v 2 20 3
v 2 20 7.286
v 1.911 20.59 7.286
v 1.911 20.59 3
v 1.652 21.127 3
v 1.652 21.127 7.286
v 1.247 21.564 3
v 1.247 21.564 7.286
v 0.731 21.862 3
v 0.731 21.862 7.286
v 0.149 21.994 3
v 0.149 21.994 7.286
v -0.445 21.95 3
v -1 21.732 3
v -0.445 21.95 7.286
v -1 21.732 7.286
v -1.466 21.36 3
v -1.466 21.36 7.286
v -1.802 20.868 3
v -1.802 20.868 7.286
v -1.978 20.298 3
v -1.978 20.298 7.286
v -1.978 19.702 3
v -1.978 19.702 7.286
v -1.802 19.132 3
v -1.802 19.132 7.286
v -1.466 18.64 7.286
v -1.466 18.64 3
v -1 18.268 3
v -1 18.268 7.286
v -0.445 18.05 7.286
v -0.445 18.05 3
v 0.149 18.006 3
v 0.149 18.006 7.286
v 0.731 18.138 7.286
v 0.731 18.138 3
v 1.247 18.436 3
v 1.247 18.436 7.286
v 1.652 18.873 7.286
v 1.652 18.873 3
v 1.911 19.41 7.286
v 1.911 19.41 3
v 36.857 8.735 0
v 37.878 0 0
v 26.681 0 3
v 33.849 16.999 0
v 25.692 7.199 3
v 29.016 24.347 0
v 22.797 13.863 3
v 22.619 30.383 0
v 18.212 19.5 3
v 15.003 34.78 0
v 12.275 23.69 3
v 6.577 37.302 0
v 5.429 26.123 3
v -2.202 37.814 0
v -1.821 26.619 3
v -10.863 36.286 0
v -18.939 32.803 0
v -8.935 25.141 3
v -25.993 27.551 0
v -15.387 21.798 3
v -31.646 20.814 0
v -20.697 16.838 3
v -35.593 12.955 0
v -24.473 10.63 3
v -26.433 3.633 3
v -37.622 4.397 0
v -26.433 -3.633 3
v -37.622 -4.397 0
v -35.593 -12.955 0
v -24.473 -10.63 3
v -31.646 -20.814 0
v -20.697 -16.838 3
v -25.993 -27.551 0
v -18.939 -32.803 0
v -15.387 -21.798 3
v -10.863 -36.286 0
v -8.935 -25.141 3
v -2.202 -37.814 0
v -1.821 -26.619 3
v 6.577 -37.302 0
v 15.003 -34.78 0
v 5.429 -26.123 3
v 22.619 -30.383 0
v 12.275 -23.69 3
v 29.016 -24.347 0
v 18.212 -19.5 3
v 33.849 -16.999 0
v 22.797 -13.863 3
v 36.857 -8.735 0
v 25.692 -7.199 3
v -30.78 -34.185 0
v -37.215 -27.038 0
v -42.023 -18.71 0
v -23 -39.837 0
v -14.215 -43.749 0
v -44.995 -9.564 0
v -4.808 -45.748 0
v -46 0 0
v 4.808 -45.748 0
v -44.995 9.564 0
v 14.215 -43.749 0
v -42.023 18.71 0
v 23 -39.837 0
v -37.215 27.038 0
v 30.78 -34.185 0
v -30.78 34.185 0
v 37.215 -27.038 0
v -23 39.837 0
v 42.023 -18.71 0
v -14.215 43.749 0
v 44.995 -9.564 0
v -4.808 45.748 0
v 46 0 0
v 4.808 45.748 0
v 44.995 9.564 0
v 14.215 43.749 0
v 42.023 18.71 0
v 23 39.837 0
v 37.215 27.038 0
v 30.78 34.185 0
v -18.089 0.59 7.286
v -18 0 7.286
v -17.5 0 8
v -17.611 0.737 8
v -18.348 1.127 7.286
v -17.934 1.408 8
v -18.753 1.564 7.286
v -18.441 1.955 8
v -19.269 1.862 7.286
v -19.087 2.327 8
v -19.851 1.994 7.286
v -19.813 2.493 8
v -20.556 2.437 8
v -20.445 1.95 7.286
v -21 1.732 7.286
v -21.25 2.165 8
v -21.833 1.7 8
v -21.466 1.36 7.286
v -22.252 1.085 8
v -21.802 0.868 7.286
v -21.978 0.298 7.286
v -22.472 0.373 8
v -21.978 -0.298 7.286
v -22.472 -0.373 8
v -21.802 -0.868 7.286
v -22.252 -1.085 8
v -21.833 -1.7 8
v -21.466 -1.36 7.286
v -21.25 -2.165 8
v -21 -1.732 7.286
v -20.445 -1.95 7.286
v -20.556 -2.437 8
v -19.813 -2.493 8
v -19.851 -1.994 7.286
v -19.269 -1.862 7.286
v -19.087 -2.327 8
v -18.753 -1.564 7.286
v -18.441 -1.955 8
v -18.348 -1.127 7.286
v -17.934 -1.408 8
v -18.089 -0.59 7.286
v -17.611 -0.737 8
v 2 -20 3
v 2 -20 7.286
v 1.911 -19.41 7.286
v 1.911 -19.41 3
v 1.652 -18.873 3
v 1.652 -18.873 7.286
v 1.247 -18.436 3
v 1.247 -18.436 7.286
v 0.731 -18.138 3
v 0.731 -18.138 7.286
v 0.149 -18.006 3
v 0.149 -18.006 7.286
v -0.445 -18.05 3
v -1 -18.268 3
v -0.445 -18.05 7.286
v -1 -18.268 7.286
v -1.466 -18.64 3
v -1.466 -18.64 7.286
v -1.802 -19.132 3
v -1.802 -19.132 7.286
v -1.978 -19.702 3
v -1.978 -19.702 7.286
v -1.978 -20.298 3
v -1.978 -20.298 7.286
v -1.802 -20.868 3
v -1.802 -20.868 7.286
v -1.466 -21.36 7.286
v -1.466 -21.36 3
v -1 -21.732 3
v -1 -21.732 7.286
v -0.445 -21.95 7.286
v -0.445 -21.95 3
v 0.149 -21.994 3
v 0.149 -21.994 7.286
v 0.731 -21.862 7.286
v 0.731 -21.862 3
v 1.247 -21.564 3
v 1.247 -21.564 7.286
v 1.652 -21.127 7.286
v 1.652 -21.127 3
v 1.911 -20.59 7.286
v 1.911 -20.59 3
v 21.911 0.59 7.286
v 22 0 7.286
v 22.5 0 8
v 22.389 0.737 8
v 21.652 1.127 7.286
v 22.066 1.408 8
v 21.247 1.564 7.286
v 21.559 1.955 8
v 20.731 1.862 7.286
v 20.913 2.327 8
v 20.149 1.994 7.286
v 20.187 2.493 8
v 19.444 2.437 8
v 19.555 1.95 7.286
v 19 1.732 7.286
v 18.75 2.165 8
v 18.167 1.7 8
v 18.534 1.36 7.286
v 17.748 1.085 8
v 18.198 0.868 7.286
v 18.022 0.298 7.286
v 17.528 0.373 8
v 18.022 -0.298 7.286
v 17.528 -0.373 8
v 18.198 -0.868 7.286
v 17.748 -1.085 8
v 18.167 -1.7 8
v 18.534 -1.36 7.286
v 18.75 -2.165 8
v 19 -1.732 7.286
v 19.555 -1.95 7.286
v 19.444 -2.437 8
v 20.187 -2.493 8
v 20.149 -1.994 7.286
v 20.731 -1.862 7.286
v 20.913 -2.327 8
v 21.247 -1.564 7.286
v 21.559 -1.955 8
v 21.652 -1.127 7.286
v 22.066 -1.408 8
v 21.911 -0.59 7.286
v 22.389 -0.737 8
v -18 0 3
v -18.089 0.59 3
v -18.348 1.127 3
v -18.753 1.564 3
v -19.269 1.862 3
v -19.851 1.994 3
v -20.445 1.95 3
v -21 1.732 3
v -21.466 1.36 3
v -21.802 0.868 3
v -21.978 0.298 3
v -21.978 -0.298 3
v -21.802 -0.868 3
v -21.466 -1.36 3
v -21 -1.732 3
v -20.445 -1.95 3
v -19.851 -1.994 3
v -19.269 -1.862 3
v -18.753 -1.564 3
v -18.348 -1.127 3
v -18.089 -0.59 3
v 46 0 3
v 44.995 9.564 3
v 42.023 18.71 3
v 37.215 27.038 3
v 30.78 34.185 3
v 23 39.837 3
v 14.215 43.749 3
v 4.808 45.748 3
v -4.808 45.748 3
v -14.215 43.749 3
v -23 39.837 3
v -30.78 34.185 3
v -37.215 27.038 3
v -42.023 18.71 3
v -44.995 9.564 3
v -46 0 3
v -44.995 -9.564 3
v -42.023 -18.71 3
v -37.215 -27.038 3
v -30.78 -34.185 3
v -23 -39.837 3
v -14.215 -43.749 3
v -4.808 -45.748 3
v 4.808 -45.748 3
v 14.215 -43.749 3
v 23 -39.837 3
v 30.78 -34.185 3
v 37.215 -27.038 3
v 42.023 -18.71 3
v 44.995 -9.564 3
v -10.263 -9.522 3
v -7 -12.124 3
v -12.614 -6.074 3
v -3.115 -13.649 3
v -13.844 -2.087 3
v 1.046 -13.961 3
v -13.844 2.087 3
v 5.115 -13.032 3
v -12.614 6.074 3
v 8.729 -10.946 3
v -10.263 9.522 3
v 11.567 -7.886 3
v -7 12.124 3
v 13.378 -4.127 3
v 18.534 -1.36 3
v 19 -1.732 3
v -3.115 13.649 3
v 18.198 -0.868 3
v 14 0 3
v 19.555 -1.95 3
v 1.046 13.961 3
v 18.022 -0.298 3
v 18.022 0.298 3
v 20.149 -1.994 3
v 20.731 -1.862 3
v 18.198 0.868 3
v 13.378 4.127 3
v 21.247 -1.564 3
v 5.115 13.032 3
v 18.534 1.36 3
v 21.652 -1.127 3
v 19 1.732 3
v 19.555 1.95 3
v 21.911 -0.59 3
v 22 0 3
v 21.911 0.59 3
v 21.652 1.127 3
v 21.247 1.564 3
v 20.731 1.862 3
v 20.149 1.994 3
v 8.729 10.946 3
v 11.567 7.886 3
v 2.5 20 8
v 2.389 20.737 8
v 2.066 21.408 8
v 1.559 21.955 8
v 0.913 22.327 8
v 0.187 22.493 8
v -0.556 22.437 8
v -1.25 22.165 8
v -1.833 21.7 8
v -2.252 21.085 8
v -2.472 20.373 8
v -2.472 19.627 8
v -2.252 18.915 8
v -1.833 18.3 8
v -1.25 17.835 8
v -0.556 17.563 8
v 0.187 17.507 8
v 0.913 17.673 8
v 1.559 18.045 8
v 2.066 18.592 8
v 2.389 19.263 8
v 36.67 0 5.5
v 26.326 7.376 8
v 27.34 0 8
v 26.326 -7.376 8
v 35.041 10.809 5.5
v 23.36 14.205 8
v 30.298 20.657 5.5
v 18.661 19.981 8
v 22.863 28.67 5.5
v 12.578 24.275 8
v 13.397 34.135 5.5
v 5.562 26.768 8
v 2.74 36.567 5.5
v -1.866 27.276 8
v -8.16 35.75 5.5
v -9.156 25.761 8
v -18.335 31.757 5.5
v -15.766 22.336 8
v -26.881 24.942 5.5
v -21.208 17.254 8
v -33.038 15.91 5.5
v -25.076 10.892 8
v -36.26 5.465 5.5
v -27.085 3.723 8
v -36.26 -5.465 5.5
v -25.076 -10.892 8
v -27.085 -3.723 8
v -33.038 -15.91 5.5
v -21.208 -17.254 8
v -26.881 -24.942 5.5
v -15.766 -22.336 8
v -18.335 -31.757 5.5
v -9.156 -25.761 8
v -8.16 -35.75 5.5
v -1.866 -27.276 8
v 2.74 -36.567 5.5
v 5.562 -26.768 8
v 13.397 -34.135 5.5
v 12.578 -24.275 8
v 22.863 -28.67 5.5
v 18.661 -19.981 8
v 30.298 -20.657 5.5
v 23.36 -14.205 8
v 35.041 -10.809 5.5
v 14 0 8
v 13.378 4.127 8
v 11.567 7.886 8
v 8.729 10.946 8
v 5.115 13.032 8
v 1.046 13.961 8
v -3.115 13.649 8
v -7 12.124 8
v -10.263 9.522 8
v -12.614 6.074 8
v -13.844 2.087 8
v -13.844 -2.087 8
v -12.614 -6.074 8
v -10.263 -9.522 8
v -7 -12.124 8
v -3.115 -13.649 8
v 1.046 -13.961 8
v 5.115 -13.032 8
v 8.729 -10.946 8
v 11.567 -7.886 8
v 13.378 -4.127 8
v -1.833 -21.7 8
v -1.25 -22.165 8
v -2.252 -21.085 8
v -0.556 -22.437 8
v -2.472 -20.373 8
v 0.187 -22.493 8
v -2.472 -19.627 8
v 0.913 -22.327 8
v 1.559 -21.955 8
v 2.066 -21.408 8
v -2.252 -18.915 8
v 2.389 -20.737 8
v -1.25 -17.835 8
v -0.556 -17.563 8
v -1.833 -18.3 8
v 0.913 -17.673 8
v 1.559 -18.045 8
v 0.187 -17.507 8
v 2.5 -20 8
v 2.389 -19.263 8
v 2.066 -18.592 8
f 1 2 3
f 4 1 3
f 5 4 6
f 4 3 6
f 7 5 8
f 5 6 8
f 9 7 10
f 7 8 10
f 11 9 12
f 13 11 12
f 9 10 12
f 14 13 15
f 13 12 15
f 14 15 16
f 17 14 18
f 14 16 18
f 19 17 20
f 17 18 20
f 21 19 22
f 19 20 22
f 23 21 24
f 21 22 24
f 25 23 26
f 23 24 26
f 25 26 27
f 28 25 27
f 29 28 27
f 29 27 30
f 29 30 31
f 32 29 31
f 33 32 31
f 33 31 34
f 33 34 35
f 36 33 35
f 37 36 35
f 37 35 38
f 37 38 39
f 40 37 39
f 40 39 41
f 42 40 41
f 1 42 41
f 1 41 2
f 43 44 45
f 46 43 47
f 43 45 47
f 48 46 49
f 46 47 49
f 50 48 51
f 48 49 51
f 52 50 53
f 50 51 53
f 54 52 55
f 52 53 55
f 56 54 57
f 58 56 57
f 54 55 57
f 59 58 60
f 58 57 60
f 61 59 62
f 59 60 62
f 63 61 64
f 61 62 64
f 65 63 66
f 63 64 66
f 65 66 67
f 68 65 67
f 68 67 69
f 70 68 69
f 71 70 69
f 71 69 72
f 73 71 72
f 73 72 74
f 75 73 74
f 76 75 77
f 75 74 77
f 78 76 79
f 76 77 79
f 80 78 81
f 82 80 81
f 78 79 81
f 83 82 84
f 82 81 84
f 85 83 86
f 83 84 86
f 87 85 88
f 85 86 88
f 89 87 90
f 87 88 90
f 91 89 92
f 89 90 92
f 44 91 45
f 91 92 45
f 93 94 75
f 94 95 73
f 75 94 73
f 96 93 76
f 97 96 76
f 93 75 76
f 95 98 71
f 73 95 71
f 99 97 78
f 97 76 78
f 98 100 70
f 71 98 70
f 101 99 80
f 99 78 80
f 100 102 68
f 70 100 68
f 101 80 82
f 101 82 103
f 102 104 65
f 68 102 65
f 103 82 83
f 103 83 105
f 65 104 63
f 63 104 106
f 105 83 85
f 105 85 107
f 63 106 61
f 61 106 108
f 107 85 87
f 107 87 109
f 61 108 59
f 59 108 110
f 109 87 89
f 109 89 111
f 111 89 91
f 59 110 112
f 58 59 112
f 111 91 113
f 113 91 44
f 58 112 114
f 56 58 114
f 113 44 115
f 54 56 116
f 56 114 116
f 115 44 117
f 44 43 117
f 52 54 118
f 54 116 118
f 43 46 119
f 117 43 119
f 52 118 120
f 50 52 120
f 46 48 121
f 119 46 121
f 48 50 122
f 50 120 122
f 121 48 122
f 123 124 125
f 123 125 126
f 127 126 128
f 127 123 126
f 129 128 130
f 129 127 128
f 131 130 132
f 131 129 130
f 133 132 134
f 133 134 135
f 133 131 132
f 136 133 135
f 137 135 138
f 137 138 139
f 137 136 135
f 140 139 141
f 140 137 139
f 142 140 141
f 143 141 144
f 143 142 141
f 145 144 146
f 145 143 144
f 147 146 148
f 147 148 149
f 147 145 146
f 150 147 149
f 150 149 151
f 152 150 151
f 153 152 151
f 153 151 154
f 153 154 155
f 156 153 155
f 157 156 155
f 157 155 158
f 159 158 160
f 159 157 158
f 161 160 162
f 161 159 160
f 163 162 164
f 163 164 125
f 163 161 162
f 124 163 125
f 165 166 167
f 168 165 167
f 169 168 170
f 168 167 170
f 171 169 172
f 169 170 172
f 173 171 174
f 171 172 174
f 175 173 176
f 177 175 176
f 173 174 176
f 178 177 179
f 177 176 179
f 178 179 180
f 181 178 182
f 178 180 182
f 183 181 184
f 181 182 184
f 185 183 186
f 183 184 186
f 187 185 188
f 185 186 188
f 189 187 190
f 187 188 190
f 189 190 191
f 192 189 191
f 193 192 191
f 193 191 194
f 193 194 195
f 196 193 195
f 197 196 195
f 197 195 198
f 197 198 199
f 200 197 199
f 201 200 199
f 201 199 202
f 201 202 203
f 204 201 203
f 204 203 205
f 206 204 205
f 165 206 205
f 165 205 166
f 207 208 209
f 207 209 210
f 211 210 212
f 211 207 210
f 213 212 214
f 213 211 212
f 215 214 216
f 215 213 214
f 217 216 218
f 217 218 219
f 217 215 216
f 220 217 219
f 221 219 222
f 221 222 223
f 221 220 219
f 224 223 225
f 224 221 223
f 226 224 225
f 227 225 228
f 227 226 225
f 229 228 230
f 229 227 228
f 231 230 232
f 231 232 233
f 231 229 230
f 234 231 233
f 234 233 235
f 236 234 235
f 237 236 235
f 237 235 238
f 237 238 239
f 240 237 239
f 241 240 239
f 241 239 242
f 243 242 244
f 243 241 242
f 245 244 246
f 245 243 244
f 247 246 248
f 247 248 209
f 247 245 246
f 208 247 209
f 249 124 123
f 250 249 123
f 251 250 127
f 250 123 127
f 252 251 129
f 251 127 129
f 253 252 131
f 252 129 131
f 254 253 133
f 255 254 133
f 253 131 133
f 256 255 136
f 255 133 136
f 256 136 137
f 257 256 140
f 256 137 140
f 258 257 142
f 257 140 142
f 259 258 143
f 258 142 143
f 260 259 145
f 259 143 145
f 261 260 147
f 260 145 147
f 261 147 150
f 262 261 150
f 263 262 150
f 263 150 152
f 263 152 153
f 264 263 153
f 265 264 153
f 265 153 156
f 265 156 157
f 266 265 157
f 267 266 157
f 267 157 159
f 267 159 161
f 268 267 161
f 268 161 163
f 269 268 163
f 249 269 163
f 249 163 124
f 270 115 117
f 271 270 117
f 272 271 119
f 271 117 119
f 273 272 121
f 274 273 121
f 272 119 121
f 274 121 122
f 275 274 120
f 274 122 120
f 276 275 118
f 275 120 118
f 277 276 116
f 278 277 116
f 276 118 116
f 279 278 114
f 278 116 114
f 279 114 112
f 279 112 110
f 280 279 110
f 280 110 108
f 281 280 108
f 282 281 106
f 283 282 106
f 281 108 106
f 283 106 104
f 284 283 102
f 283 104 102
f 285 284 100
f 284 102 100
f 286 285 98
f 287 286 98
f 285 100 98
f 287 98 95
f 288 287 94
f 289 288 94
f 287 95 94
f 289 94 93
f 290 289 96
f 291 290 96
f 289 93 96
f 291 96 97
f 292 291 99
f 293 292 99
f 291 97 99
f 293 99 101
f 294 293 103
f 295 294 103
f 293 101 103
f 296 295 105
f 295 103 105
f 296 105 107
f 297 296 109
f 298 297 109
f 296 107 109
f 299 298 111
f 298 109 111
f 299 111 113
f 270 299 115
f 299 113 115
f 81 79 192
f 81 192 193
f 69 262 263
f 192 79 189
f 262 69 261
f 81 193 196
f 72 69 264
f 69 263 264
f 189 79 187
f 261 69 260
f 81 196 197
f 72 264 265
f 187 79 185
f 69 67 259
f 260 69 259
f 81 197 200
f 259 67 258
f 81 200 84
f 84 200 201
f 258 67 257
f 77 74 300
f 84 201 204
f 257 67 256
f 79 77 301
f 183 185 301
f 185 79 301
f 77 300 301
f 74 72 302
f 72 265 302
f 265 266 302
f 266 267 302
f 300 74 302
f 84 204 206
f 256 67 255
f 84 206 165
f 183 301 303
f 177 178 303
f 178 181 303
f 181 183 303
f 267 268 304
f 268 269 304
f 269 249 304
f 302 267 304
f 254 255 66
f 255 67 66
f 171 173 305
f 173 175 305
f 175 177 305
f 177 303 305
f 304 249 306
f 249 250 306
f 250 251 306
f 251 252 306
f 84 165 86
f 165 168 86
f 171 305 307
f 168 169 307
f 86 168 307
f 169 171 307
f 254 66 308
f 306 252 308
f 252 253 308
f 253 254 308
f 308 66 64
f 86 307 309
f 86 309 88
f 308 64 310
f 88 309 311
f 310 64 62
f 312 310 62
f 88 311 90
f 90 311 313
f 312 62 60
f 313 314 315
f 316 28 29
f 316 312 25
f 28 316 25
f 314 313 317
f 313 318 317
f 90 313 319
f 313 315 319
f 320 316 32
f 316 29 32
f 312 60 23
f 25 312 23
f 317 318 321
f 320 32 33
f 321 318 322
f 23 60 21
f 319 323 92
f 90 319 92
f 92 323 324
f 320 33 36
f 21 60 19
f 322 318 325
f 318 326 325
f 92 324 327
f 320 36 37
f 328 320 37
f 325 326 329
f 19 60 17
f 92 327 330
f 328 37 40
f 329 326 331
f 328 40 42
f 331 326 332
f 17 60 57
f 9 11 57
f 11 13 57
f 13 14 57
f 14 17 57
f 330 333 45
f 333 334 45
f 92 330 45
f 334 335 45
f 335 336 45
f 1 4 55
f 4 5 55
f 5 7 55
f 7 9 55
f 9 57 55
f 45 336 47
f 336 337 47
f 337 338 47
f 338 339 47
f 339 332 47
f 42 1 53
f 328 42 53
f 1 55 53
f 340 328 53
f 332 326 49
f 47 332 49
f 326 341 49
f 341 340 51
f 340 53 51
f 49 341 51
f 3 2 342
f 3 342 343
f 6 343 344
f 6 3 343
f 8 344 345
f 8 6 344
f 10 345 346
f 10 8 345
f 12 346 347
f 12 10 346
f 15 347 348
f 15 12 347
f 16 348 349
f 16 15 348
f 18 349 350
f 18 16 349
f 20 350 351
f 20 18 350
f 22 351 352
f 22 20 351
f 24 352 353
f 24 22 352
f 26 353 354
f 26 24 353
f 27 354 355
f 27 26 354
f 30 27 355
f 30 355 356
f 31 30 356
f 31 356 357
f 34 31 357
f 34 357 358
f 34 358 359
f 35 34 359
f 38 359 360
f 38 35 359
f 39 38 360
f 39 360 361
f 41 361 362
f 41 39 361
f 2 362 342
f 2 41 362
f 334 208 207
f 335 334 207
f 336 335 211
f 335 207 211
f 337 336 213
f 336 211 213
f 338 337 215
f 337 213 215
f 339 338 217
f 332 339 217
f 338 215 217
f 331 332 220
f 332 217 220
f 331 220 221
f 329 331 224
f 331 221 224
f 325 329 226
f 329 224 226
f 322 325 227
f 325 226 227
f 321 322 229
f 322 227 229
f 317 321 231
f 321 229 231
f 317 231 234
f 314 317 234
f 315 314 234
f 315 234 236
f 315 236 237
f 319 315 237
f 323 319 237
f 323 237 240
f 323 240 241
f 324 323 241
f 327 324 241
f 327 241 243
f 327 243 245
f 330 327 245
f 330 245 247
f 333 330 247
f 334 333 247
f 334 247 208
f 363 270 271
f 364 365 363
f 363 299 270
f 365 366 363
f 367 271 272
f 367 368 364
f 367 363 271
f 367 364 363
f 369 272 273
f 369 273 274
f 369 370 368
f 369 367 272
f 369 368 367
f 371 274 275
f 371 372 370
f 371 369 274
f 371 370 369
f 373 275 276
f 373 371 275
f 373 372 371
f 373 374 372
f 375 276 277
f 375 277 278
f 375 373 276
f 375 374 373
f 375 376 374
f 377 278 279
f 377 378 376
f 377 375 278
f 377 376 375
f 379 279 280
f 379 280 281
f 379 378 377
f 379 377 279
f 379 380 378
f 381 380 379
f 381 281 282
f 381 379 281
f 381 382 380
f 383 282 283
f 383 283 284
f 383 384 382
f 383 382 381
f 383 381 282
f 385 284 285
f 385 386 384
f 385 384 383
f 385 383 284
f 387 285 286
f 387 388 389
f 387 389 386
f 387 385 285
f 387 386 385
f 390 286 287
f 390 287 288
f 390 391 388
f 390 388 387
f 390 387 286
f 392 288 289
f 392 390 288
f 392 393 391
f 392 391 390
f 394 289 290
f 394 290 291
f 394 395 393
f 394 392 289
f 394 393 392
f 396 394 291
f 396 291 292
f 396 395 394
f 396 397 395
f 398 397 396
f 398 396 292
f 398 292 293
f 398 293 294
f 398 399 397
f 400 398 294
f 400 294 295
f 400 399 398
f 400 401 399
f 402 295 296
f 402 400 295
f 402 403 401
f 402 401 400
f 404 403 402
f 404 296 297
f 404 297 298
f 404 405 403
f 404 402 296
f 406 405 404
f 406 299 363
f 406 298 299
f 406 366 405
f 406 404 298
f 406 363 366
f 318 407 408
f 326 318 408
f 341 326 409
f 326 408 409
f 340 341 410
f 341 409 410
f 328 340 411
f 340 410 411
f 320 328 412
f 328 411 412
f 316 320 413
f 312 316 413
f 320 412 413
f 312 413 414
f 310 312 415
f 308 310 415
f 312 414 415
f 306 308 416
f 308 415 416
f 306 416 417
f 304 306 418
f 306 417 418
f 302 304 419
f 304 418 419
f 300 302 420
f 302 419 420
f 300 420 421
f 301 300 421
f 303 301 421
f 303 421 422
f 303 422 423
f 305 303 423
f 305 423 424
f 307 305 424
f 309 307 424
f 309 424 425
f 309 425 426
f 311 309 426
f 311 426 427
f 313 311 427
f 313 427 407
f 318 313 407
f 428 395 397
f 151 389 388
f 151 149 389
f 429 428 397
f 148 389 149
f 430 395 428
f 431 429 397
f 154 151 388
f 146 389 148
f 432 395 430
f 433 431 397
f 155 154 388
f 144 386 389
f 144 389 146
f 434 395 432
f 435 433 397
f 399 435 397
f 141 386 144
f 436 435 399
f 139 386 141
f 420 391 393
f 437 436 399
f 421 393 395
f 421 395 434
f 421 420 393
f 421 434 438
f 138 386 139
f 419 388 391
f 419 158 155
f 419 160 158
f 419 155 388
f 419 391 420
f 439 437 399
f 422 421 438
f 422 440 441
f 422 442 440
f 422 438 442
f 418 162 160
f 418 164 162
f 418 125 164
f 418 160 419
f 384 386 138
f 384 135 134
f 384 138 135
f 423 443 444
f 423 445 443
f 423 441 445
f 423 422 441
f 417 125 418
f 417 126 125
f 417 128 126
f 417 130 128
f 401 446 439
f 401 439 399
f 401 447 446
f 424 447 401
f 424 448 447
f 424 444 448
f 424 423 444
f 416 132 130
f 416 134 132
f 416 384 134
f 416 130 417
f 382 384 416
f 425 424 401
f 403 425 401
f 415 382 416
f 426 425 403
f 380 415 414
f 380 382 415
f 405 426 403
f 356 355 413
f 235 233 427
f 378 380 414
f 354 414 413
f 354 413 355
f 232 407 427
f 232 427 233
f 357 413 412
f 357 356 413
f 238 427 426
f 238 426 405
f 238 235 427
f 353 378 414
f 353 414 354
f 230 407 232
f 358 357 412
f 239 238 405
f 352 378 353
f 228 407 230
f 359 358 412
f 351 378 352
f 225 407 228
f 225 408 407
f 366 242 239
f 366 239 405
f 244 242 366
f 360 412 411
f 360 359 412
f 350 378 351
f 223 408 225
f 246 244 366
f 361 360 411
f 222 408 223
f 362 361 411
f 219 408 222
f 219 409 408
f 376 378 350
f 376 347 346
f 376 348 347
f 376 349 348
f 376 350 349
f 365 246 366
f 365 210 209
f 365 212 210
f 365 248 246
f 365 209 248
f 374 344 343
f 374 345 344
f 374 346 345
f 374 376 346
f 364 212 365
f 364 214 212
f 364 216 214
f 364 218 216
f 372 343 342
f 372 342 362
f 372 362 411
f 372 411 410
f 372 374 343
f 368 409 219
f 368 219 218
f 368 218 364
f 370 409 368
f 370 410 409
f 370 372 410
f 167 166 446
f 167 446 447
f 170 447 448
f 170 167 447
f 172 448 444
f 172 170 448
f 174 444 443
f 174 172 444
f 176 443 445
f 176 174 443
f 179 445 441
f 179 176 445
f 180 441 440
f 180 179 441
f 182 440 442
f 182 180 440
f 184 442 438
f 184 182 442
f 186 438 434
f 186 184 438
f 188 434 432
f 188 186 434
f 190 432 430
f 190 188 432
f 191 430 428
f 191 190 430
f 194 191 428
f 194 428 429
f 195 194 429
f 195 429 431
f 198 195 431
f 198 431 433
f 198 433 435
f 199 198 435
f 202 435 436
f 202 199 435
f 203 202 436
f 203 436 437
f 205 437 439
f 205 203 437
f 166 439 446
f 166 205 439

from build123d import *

# Parameters (mm, degrees)
ESQUISSE1_R             = 46
BOSS_EXTRU_1_DEPTH      = 3
ESQUISSE2_R             = 46
BOSS_EXTRU_2_DEPTH      = 5
BOSS_EXTRU_2_TAPER      = 75
ESQUISSE3_R             = 2
ENL_V_MAT_EXTRU_1_DEPTH = 66.543878433
ESQUISSE4_R             = 14
ENL_V_MAT_EXTRU_2_DEPTH = 66.543878433
CHANFREIN1_SIZE         = 0.5
CHANFREIN1_SIZE2        = 0.714074003


# Read off the part's stored shape, not the designer's step: Coque1
with BuildPart() as part:
    # Esquisse1 → Boss.-Extru.1 (new body)
    with BuildSketch(Plane.XY):
        Circle(ESQUISSE1_R)
    extrude(amount=BOSS_EXTRU_1_DEPTH)

    # Esquisse2 → Boss.-Extru.2 (add)
    with BuildSketch(Plane.XY.offset(3)):
        Circle(ESQUISSE2_R)
    extrude(amount=BOSS_EXTRU_2_DEPTH, taper=BOSS_EXTRU_2_TAPER)

    # Coque1 outline → Coque1 (revolve, cut)
    with BuildSketch(Plane.XZ):
        Polygon((37.877635897, 0), (26.681483474, 3), (0, 3), (0, 0), align=None)
    revolve(axis=Axis((0, 0, 0), (0, 0, 1)), mode=Mode.SUBTRACT)

    # Esquisse3 → Enlèv. mat.-Extru.1 (cut, through all)
    with BuildSketch(Plane.XY.offset(8)):
        with Locations((0, 20)):
            Circle(ESQUISSE3_R)
        with Locations((20, 0)):
            Circle(ESQUISSE3_R)
        with Locations((0, -20)):
            Circle(ESQUISSE3_R)
        with Locations((-20, 0)):
            Circle(ESQUISSE3_R)
    extrude(amount=-ENL_V_MAT_EXTRU_1_DEPTH, mode=Mode.SUBTRACT)

    # Esquisse4 → Enlèv. mat.-Extru.2 (cut, through all)
    with BuildSketch(Plane.XY.offset(8)):
        Circle(ESQUISSE4_R)
    extrude(amount=-ENL_V_MAT_EXTRU_2_DEPTH, mode=Mode.SUBTRACT)

    # Chanfrein1
    chanfrein1_edges = [part.edges().sort_by_distance(p)[0] for p in [
        (-2, 20, 8),
        (18, 0, 8),
        (-2, -20, 8),
        (-22, 0, 8),
    ]]
    chanfrein1_side = [part.faces().sort_by_distance(p)[0] for p in [
        (-26.566461172, 0, 8),
    ]]
    chamfer(chanfrein1_edges, length=CHANFREIN1_SIZE, length2=CHANFREIN1_SIZE2, reference=chanfrein1_side[0])


solid = part.part
